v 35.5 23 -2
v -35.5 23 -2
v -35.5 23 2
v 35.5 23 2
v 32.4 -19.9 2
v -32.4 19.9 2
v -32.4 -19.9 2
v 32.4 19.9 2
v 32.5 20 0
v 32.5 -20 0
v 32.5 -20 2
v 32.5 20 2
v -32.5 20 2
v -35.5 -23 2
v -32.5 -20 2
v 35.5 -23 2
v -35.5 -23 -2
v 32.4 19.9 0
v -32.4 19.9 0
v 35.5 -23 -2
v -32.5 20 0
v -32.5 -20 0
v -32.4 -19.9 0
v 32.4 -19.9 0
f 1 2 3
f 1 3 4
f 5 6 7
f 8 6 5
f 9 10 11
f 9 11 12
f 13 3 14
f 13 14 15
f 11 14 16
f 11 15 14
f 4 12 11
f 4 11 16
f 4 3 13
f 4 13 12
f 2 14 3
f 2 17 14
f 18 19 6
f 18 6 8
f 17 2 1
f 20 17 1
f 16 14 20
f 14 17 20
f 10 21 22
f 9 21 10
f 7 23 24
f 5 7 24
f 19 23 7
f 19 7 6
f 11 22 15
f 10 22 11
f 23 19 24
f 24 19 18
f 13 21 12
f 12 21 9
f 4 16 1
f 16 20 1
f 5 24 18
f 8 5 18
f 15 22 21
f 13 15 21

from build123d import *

# Parameters (mm, degrees)
F0_W     = 64.8
F0_H     = 39.8
F1_DEPTH = 2
F0_W_2   = 71
F0_H_2   = 46
F0_W_3   = 65
F0_H_3   = 40
F2_DEPTH = 2
F3_DEPTH = 2


with BuildPart() as f1:
    # F0 (on Top) → F1 (new body)
    with BuildSketch(Plane.XY):
        Rectangle(F0_W, F0_H)
    extrude(amount=F1_DEPTH)


with BuildPart() as f2:
    # F0 (on Top) → F2 (new body)
    with BuildSketch(Plane.XY):
        Rectangle(F0_W_2, F0_H_2)
        Rectangle(F0_W_3, F0_H_3, mode=Mode.SUBTRACT)
        Rectangle(F0_W_3, F0_H_3)
        Rectangle(F0_W, F0_H, mode=Mode.SUBTRACT)
        Rectangle(F0_W, F0_H)
    extrude(amount=-F2_DEPTH)

    # F0 (on Top) → F3 (join)
    with BuildSketch(Plane.XY):
        Rectangle(F0_W_2, F0_H_2)
        Rectangle(F0_W_3, F0_H_3, mode=Mode.SUBTRACT)
    extrude(amount=F3_DEPTH)


solid = Compound([f1.part, f2.part])
